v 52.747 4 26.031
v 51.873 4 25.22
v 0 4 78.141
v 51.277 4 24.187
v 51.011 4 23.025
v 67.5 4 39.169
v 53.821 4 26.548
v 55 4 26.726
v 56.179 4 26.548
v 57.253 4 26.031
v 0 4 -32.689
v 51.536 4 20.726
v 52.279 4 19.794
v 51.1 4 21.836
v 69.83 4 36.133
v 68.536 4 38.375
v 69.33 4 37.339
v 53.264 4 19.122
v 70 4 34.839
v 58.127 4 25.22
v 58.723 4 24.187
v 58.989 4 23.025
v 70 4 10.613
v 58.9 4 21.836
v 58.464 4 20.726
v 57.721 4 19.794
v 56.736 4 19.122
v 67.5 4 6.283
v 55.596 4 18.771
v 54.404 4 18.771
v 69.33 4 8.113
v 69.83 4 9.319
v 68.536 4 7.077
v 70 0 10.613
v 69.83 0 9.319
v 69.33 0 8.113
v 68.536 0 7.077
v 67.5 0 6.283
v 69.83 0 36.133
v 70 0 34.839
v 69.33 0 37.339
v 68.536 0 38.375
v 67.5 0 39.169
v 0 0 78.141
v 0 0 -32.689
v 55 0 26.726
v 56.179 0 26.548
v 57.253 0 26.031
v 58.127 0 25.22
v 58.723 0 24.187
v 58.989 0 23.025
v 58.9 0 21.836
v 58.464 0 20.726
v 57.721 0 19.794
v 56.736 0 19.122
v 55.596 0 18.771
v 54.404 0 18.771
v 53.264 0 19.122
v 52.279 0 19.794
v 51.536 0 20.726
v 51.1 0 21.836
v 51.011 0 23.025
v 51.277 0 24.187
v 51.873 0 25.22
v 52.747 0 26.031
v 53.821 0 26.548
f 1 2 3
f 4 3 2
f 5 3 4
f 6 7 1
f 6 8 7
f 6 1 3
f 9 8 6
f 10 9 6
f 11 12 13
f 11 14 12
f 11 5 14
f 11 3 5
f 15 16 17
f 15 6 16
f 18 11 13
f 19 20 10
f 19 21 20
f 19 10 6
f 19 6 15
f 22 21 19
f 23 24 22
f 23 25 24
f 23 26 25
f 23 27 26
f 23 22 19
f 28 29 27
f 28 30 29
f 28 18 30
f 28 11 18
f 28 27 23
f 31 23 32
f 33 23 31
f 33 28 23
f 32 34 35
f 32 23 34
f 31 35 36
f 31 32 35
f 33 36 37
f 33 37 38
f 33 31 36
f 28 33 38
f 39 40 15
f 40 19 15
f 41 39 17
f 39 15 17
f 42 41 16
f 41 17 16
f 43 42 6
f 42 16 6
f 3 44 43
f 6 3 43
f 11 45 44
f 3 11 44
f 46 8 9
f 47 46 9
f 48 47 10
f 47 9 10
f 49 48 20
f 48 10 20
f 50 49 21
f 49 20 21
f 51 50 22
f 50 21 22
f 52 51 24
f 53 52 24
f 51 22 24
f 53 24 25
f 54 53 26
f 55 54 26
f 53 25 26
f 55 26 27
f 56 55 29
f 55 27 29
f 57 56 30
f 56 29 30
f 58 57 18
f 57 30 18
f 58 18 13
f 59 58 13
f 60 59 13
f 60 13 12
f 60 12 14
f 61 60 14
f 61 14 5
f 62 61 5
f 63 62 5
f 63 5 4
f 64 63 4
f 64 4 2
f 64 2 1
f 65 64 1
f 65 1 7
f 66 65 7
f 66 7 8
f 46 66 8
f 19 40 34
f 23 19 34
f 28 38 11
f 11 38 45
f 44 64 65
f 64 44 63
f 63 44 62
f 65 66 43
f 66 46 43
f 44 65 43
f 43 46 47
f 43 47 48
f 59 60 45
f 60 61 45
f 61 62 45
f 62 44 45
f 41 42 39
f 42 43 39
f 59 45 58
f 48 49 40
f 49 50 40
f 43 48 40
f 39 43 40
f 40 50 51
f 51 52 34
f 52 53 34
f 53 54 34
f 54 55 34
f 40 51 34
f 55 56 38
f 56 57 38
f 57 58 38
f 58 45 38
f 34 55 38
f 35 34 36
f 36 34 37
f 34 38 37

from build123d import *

# Parameters (mm, degrees)
BOSS_EXTRUDE1_DEPTH = 4
SKETCH3_R           = 4
CUT_EXTRUDE1_DEPTH  = 105.985426706
FILLET1_R           = 5


with BuildPart() as part:
    # Sketch2 → Boss-Extrude1 (new body)
    with BuildSketch(Plane(origin=(0, 0, 0), x_dir=(1, 0, 0), z_dir=(0, 1, 0))):
        Polygon((70, -37.725994468), (70, -7.725994468), (0, 32.688524375), (0, -78.140513312), align=None)
    extrude(amount=BOSS_EXTRUDE1_DEPTH)

    # Sketch3 → Cut-Extrude1 (cut, through all)
    with BuildSketch(Plane(origin=(0, 4, 0), x_dir=(1, 0, 0), z_dir=(0, 1, 0))):
        with Locations(Location((55, -22.725994468, 0), (0, 0, 270))):
            Circle(SKETCH3_R)
    extrude(amount=-CUT_EXTRUDE1_DEPTH, mode=Mode.SUBTRACT)

    # Fillet1
    fillet1_edges = [part.edges().sort_by_distance(p)[0] for p in [
        (70, 2, 7.725994468),
        (70, 2, 37.725994468),
    ]]
    fillet(fillet1_edges, radius=FILLET1_R)


solid = part.part
